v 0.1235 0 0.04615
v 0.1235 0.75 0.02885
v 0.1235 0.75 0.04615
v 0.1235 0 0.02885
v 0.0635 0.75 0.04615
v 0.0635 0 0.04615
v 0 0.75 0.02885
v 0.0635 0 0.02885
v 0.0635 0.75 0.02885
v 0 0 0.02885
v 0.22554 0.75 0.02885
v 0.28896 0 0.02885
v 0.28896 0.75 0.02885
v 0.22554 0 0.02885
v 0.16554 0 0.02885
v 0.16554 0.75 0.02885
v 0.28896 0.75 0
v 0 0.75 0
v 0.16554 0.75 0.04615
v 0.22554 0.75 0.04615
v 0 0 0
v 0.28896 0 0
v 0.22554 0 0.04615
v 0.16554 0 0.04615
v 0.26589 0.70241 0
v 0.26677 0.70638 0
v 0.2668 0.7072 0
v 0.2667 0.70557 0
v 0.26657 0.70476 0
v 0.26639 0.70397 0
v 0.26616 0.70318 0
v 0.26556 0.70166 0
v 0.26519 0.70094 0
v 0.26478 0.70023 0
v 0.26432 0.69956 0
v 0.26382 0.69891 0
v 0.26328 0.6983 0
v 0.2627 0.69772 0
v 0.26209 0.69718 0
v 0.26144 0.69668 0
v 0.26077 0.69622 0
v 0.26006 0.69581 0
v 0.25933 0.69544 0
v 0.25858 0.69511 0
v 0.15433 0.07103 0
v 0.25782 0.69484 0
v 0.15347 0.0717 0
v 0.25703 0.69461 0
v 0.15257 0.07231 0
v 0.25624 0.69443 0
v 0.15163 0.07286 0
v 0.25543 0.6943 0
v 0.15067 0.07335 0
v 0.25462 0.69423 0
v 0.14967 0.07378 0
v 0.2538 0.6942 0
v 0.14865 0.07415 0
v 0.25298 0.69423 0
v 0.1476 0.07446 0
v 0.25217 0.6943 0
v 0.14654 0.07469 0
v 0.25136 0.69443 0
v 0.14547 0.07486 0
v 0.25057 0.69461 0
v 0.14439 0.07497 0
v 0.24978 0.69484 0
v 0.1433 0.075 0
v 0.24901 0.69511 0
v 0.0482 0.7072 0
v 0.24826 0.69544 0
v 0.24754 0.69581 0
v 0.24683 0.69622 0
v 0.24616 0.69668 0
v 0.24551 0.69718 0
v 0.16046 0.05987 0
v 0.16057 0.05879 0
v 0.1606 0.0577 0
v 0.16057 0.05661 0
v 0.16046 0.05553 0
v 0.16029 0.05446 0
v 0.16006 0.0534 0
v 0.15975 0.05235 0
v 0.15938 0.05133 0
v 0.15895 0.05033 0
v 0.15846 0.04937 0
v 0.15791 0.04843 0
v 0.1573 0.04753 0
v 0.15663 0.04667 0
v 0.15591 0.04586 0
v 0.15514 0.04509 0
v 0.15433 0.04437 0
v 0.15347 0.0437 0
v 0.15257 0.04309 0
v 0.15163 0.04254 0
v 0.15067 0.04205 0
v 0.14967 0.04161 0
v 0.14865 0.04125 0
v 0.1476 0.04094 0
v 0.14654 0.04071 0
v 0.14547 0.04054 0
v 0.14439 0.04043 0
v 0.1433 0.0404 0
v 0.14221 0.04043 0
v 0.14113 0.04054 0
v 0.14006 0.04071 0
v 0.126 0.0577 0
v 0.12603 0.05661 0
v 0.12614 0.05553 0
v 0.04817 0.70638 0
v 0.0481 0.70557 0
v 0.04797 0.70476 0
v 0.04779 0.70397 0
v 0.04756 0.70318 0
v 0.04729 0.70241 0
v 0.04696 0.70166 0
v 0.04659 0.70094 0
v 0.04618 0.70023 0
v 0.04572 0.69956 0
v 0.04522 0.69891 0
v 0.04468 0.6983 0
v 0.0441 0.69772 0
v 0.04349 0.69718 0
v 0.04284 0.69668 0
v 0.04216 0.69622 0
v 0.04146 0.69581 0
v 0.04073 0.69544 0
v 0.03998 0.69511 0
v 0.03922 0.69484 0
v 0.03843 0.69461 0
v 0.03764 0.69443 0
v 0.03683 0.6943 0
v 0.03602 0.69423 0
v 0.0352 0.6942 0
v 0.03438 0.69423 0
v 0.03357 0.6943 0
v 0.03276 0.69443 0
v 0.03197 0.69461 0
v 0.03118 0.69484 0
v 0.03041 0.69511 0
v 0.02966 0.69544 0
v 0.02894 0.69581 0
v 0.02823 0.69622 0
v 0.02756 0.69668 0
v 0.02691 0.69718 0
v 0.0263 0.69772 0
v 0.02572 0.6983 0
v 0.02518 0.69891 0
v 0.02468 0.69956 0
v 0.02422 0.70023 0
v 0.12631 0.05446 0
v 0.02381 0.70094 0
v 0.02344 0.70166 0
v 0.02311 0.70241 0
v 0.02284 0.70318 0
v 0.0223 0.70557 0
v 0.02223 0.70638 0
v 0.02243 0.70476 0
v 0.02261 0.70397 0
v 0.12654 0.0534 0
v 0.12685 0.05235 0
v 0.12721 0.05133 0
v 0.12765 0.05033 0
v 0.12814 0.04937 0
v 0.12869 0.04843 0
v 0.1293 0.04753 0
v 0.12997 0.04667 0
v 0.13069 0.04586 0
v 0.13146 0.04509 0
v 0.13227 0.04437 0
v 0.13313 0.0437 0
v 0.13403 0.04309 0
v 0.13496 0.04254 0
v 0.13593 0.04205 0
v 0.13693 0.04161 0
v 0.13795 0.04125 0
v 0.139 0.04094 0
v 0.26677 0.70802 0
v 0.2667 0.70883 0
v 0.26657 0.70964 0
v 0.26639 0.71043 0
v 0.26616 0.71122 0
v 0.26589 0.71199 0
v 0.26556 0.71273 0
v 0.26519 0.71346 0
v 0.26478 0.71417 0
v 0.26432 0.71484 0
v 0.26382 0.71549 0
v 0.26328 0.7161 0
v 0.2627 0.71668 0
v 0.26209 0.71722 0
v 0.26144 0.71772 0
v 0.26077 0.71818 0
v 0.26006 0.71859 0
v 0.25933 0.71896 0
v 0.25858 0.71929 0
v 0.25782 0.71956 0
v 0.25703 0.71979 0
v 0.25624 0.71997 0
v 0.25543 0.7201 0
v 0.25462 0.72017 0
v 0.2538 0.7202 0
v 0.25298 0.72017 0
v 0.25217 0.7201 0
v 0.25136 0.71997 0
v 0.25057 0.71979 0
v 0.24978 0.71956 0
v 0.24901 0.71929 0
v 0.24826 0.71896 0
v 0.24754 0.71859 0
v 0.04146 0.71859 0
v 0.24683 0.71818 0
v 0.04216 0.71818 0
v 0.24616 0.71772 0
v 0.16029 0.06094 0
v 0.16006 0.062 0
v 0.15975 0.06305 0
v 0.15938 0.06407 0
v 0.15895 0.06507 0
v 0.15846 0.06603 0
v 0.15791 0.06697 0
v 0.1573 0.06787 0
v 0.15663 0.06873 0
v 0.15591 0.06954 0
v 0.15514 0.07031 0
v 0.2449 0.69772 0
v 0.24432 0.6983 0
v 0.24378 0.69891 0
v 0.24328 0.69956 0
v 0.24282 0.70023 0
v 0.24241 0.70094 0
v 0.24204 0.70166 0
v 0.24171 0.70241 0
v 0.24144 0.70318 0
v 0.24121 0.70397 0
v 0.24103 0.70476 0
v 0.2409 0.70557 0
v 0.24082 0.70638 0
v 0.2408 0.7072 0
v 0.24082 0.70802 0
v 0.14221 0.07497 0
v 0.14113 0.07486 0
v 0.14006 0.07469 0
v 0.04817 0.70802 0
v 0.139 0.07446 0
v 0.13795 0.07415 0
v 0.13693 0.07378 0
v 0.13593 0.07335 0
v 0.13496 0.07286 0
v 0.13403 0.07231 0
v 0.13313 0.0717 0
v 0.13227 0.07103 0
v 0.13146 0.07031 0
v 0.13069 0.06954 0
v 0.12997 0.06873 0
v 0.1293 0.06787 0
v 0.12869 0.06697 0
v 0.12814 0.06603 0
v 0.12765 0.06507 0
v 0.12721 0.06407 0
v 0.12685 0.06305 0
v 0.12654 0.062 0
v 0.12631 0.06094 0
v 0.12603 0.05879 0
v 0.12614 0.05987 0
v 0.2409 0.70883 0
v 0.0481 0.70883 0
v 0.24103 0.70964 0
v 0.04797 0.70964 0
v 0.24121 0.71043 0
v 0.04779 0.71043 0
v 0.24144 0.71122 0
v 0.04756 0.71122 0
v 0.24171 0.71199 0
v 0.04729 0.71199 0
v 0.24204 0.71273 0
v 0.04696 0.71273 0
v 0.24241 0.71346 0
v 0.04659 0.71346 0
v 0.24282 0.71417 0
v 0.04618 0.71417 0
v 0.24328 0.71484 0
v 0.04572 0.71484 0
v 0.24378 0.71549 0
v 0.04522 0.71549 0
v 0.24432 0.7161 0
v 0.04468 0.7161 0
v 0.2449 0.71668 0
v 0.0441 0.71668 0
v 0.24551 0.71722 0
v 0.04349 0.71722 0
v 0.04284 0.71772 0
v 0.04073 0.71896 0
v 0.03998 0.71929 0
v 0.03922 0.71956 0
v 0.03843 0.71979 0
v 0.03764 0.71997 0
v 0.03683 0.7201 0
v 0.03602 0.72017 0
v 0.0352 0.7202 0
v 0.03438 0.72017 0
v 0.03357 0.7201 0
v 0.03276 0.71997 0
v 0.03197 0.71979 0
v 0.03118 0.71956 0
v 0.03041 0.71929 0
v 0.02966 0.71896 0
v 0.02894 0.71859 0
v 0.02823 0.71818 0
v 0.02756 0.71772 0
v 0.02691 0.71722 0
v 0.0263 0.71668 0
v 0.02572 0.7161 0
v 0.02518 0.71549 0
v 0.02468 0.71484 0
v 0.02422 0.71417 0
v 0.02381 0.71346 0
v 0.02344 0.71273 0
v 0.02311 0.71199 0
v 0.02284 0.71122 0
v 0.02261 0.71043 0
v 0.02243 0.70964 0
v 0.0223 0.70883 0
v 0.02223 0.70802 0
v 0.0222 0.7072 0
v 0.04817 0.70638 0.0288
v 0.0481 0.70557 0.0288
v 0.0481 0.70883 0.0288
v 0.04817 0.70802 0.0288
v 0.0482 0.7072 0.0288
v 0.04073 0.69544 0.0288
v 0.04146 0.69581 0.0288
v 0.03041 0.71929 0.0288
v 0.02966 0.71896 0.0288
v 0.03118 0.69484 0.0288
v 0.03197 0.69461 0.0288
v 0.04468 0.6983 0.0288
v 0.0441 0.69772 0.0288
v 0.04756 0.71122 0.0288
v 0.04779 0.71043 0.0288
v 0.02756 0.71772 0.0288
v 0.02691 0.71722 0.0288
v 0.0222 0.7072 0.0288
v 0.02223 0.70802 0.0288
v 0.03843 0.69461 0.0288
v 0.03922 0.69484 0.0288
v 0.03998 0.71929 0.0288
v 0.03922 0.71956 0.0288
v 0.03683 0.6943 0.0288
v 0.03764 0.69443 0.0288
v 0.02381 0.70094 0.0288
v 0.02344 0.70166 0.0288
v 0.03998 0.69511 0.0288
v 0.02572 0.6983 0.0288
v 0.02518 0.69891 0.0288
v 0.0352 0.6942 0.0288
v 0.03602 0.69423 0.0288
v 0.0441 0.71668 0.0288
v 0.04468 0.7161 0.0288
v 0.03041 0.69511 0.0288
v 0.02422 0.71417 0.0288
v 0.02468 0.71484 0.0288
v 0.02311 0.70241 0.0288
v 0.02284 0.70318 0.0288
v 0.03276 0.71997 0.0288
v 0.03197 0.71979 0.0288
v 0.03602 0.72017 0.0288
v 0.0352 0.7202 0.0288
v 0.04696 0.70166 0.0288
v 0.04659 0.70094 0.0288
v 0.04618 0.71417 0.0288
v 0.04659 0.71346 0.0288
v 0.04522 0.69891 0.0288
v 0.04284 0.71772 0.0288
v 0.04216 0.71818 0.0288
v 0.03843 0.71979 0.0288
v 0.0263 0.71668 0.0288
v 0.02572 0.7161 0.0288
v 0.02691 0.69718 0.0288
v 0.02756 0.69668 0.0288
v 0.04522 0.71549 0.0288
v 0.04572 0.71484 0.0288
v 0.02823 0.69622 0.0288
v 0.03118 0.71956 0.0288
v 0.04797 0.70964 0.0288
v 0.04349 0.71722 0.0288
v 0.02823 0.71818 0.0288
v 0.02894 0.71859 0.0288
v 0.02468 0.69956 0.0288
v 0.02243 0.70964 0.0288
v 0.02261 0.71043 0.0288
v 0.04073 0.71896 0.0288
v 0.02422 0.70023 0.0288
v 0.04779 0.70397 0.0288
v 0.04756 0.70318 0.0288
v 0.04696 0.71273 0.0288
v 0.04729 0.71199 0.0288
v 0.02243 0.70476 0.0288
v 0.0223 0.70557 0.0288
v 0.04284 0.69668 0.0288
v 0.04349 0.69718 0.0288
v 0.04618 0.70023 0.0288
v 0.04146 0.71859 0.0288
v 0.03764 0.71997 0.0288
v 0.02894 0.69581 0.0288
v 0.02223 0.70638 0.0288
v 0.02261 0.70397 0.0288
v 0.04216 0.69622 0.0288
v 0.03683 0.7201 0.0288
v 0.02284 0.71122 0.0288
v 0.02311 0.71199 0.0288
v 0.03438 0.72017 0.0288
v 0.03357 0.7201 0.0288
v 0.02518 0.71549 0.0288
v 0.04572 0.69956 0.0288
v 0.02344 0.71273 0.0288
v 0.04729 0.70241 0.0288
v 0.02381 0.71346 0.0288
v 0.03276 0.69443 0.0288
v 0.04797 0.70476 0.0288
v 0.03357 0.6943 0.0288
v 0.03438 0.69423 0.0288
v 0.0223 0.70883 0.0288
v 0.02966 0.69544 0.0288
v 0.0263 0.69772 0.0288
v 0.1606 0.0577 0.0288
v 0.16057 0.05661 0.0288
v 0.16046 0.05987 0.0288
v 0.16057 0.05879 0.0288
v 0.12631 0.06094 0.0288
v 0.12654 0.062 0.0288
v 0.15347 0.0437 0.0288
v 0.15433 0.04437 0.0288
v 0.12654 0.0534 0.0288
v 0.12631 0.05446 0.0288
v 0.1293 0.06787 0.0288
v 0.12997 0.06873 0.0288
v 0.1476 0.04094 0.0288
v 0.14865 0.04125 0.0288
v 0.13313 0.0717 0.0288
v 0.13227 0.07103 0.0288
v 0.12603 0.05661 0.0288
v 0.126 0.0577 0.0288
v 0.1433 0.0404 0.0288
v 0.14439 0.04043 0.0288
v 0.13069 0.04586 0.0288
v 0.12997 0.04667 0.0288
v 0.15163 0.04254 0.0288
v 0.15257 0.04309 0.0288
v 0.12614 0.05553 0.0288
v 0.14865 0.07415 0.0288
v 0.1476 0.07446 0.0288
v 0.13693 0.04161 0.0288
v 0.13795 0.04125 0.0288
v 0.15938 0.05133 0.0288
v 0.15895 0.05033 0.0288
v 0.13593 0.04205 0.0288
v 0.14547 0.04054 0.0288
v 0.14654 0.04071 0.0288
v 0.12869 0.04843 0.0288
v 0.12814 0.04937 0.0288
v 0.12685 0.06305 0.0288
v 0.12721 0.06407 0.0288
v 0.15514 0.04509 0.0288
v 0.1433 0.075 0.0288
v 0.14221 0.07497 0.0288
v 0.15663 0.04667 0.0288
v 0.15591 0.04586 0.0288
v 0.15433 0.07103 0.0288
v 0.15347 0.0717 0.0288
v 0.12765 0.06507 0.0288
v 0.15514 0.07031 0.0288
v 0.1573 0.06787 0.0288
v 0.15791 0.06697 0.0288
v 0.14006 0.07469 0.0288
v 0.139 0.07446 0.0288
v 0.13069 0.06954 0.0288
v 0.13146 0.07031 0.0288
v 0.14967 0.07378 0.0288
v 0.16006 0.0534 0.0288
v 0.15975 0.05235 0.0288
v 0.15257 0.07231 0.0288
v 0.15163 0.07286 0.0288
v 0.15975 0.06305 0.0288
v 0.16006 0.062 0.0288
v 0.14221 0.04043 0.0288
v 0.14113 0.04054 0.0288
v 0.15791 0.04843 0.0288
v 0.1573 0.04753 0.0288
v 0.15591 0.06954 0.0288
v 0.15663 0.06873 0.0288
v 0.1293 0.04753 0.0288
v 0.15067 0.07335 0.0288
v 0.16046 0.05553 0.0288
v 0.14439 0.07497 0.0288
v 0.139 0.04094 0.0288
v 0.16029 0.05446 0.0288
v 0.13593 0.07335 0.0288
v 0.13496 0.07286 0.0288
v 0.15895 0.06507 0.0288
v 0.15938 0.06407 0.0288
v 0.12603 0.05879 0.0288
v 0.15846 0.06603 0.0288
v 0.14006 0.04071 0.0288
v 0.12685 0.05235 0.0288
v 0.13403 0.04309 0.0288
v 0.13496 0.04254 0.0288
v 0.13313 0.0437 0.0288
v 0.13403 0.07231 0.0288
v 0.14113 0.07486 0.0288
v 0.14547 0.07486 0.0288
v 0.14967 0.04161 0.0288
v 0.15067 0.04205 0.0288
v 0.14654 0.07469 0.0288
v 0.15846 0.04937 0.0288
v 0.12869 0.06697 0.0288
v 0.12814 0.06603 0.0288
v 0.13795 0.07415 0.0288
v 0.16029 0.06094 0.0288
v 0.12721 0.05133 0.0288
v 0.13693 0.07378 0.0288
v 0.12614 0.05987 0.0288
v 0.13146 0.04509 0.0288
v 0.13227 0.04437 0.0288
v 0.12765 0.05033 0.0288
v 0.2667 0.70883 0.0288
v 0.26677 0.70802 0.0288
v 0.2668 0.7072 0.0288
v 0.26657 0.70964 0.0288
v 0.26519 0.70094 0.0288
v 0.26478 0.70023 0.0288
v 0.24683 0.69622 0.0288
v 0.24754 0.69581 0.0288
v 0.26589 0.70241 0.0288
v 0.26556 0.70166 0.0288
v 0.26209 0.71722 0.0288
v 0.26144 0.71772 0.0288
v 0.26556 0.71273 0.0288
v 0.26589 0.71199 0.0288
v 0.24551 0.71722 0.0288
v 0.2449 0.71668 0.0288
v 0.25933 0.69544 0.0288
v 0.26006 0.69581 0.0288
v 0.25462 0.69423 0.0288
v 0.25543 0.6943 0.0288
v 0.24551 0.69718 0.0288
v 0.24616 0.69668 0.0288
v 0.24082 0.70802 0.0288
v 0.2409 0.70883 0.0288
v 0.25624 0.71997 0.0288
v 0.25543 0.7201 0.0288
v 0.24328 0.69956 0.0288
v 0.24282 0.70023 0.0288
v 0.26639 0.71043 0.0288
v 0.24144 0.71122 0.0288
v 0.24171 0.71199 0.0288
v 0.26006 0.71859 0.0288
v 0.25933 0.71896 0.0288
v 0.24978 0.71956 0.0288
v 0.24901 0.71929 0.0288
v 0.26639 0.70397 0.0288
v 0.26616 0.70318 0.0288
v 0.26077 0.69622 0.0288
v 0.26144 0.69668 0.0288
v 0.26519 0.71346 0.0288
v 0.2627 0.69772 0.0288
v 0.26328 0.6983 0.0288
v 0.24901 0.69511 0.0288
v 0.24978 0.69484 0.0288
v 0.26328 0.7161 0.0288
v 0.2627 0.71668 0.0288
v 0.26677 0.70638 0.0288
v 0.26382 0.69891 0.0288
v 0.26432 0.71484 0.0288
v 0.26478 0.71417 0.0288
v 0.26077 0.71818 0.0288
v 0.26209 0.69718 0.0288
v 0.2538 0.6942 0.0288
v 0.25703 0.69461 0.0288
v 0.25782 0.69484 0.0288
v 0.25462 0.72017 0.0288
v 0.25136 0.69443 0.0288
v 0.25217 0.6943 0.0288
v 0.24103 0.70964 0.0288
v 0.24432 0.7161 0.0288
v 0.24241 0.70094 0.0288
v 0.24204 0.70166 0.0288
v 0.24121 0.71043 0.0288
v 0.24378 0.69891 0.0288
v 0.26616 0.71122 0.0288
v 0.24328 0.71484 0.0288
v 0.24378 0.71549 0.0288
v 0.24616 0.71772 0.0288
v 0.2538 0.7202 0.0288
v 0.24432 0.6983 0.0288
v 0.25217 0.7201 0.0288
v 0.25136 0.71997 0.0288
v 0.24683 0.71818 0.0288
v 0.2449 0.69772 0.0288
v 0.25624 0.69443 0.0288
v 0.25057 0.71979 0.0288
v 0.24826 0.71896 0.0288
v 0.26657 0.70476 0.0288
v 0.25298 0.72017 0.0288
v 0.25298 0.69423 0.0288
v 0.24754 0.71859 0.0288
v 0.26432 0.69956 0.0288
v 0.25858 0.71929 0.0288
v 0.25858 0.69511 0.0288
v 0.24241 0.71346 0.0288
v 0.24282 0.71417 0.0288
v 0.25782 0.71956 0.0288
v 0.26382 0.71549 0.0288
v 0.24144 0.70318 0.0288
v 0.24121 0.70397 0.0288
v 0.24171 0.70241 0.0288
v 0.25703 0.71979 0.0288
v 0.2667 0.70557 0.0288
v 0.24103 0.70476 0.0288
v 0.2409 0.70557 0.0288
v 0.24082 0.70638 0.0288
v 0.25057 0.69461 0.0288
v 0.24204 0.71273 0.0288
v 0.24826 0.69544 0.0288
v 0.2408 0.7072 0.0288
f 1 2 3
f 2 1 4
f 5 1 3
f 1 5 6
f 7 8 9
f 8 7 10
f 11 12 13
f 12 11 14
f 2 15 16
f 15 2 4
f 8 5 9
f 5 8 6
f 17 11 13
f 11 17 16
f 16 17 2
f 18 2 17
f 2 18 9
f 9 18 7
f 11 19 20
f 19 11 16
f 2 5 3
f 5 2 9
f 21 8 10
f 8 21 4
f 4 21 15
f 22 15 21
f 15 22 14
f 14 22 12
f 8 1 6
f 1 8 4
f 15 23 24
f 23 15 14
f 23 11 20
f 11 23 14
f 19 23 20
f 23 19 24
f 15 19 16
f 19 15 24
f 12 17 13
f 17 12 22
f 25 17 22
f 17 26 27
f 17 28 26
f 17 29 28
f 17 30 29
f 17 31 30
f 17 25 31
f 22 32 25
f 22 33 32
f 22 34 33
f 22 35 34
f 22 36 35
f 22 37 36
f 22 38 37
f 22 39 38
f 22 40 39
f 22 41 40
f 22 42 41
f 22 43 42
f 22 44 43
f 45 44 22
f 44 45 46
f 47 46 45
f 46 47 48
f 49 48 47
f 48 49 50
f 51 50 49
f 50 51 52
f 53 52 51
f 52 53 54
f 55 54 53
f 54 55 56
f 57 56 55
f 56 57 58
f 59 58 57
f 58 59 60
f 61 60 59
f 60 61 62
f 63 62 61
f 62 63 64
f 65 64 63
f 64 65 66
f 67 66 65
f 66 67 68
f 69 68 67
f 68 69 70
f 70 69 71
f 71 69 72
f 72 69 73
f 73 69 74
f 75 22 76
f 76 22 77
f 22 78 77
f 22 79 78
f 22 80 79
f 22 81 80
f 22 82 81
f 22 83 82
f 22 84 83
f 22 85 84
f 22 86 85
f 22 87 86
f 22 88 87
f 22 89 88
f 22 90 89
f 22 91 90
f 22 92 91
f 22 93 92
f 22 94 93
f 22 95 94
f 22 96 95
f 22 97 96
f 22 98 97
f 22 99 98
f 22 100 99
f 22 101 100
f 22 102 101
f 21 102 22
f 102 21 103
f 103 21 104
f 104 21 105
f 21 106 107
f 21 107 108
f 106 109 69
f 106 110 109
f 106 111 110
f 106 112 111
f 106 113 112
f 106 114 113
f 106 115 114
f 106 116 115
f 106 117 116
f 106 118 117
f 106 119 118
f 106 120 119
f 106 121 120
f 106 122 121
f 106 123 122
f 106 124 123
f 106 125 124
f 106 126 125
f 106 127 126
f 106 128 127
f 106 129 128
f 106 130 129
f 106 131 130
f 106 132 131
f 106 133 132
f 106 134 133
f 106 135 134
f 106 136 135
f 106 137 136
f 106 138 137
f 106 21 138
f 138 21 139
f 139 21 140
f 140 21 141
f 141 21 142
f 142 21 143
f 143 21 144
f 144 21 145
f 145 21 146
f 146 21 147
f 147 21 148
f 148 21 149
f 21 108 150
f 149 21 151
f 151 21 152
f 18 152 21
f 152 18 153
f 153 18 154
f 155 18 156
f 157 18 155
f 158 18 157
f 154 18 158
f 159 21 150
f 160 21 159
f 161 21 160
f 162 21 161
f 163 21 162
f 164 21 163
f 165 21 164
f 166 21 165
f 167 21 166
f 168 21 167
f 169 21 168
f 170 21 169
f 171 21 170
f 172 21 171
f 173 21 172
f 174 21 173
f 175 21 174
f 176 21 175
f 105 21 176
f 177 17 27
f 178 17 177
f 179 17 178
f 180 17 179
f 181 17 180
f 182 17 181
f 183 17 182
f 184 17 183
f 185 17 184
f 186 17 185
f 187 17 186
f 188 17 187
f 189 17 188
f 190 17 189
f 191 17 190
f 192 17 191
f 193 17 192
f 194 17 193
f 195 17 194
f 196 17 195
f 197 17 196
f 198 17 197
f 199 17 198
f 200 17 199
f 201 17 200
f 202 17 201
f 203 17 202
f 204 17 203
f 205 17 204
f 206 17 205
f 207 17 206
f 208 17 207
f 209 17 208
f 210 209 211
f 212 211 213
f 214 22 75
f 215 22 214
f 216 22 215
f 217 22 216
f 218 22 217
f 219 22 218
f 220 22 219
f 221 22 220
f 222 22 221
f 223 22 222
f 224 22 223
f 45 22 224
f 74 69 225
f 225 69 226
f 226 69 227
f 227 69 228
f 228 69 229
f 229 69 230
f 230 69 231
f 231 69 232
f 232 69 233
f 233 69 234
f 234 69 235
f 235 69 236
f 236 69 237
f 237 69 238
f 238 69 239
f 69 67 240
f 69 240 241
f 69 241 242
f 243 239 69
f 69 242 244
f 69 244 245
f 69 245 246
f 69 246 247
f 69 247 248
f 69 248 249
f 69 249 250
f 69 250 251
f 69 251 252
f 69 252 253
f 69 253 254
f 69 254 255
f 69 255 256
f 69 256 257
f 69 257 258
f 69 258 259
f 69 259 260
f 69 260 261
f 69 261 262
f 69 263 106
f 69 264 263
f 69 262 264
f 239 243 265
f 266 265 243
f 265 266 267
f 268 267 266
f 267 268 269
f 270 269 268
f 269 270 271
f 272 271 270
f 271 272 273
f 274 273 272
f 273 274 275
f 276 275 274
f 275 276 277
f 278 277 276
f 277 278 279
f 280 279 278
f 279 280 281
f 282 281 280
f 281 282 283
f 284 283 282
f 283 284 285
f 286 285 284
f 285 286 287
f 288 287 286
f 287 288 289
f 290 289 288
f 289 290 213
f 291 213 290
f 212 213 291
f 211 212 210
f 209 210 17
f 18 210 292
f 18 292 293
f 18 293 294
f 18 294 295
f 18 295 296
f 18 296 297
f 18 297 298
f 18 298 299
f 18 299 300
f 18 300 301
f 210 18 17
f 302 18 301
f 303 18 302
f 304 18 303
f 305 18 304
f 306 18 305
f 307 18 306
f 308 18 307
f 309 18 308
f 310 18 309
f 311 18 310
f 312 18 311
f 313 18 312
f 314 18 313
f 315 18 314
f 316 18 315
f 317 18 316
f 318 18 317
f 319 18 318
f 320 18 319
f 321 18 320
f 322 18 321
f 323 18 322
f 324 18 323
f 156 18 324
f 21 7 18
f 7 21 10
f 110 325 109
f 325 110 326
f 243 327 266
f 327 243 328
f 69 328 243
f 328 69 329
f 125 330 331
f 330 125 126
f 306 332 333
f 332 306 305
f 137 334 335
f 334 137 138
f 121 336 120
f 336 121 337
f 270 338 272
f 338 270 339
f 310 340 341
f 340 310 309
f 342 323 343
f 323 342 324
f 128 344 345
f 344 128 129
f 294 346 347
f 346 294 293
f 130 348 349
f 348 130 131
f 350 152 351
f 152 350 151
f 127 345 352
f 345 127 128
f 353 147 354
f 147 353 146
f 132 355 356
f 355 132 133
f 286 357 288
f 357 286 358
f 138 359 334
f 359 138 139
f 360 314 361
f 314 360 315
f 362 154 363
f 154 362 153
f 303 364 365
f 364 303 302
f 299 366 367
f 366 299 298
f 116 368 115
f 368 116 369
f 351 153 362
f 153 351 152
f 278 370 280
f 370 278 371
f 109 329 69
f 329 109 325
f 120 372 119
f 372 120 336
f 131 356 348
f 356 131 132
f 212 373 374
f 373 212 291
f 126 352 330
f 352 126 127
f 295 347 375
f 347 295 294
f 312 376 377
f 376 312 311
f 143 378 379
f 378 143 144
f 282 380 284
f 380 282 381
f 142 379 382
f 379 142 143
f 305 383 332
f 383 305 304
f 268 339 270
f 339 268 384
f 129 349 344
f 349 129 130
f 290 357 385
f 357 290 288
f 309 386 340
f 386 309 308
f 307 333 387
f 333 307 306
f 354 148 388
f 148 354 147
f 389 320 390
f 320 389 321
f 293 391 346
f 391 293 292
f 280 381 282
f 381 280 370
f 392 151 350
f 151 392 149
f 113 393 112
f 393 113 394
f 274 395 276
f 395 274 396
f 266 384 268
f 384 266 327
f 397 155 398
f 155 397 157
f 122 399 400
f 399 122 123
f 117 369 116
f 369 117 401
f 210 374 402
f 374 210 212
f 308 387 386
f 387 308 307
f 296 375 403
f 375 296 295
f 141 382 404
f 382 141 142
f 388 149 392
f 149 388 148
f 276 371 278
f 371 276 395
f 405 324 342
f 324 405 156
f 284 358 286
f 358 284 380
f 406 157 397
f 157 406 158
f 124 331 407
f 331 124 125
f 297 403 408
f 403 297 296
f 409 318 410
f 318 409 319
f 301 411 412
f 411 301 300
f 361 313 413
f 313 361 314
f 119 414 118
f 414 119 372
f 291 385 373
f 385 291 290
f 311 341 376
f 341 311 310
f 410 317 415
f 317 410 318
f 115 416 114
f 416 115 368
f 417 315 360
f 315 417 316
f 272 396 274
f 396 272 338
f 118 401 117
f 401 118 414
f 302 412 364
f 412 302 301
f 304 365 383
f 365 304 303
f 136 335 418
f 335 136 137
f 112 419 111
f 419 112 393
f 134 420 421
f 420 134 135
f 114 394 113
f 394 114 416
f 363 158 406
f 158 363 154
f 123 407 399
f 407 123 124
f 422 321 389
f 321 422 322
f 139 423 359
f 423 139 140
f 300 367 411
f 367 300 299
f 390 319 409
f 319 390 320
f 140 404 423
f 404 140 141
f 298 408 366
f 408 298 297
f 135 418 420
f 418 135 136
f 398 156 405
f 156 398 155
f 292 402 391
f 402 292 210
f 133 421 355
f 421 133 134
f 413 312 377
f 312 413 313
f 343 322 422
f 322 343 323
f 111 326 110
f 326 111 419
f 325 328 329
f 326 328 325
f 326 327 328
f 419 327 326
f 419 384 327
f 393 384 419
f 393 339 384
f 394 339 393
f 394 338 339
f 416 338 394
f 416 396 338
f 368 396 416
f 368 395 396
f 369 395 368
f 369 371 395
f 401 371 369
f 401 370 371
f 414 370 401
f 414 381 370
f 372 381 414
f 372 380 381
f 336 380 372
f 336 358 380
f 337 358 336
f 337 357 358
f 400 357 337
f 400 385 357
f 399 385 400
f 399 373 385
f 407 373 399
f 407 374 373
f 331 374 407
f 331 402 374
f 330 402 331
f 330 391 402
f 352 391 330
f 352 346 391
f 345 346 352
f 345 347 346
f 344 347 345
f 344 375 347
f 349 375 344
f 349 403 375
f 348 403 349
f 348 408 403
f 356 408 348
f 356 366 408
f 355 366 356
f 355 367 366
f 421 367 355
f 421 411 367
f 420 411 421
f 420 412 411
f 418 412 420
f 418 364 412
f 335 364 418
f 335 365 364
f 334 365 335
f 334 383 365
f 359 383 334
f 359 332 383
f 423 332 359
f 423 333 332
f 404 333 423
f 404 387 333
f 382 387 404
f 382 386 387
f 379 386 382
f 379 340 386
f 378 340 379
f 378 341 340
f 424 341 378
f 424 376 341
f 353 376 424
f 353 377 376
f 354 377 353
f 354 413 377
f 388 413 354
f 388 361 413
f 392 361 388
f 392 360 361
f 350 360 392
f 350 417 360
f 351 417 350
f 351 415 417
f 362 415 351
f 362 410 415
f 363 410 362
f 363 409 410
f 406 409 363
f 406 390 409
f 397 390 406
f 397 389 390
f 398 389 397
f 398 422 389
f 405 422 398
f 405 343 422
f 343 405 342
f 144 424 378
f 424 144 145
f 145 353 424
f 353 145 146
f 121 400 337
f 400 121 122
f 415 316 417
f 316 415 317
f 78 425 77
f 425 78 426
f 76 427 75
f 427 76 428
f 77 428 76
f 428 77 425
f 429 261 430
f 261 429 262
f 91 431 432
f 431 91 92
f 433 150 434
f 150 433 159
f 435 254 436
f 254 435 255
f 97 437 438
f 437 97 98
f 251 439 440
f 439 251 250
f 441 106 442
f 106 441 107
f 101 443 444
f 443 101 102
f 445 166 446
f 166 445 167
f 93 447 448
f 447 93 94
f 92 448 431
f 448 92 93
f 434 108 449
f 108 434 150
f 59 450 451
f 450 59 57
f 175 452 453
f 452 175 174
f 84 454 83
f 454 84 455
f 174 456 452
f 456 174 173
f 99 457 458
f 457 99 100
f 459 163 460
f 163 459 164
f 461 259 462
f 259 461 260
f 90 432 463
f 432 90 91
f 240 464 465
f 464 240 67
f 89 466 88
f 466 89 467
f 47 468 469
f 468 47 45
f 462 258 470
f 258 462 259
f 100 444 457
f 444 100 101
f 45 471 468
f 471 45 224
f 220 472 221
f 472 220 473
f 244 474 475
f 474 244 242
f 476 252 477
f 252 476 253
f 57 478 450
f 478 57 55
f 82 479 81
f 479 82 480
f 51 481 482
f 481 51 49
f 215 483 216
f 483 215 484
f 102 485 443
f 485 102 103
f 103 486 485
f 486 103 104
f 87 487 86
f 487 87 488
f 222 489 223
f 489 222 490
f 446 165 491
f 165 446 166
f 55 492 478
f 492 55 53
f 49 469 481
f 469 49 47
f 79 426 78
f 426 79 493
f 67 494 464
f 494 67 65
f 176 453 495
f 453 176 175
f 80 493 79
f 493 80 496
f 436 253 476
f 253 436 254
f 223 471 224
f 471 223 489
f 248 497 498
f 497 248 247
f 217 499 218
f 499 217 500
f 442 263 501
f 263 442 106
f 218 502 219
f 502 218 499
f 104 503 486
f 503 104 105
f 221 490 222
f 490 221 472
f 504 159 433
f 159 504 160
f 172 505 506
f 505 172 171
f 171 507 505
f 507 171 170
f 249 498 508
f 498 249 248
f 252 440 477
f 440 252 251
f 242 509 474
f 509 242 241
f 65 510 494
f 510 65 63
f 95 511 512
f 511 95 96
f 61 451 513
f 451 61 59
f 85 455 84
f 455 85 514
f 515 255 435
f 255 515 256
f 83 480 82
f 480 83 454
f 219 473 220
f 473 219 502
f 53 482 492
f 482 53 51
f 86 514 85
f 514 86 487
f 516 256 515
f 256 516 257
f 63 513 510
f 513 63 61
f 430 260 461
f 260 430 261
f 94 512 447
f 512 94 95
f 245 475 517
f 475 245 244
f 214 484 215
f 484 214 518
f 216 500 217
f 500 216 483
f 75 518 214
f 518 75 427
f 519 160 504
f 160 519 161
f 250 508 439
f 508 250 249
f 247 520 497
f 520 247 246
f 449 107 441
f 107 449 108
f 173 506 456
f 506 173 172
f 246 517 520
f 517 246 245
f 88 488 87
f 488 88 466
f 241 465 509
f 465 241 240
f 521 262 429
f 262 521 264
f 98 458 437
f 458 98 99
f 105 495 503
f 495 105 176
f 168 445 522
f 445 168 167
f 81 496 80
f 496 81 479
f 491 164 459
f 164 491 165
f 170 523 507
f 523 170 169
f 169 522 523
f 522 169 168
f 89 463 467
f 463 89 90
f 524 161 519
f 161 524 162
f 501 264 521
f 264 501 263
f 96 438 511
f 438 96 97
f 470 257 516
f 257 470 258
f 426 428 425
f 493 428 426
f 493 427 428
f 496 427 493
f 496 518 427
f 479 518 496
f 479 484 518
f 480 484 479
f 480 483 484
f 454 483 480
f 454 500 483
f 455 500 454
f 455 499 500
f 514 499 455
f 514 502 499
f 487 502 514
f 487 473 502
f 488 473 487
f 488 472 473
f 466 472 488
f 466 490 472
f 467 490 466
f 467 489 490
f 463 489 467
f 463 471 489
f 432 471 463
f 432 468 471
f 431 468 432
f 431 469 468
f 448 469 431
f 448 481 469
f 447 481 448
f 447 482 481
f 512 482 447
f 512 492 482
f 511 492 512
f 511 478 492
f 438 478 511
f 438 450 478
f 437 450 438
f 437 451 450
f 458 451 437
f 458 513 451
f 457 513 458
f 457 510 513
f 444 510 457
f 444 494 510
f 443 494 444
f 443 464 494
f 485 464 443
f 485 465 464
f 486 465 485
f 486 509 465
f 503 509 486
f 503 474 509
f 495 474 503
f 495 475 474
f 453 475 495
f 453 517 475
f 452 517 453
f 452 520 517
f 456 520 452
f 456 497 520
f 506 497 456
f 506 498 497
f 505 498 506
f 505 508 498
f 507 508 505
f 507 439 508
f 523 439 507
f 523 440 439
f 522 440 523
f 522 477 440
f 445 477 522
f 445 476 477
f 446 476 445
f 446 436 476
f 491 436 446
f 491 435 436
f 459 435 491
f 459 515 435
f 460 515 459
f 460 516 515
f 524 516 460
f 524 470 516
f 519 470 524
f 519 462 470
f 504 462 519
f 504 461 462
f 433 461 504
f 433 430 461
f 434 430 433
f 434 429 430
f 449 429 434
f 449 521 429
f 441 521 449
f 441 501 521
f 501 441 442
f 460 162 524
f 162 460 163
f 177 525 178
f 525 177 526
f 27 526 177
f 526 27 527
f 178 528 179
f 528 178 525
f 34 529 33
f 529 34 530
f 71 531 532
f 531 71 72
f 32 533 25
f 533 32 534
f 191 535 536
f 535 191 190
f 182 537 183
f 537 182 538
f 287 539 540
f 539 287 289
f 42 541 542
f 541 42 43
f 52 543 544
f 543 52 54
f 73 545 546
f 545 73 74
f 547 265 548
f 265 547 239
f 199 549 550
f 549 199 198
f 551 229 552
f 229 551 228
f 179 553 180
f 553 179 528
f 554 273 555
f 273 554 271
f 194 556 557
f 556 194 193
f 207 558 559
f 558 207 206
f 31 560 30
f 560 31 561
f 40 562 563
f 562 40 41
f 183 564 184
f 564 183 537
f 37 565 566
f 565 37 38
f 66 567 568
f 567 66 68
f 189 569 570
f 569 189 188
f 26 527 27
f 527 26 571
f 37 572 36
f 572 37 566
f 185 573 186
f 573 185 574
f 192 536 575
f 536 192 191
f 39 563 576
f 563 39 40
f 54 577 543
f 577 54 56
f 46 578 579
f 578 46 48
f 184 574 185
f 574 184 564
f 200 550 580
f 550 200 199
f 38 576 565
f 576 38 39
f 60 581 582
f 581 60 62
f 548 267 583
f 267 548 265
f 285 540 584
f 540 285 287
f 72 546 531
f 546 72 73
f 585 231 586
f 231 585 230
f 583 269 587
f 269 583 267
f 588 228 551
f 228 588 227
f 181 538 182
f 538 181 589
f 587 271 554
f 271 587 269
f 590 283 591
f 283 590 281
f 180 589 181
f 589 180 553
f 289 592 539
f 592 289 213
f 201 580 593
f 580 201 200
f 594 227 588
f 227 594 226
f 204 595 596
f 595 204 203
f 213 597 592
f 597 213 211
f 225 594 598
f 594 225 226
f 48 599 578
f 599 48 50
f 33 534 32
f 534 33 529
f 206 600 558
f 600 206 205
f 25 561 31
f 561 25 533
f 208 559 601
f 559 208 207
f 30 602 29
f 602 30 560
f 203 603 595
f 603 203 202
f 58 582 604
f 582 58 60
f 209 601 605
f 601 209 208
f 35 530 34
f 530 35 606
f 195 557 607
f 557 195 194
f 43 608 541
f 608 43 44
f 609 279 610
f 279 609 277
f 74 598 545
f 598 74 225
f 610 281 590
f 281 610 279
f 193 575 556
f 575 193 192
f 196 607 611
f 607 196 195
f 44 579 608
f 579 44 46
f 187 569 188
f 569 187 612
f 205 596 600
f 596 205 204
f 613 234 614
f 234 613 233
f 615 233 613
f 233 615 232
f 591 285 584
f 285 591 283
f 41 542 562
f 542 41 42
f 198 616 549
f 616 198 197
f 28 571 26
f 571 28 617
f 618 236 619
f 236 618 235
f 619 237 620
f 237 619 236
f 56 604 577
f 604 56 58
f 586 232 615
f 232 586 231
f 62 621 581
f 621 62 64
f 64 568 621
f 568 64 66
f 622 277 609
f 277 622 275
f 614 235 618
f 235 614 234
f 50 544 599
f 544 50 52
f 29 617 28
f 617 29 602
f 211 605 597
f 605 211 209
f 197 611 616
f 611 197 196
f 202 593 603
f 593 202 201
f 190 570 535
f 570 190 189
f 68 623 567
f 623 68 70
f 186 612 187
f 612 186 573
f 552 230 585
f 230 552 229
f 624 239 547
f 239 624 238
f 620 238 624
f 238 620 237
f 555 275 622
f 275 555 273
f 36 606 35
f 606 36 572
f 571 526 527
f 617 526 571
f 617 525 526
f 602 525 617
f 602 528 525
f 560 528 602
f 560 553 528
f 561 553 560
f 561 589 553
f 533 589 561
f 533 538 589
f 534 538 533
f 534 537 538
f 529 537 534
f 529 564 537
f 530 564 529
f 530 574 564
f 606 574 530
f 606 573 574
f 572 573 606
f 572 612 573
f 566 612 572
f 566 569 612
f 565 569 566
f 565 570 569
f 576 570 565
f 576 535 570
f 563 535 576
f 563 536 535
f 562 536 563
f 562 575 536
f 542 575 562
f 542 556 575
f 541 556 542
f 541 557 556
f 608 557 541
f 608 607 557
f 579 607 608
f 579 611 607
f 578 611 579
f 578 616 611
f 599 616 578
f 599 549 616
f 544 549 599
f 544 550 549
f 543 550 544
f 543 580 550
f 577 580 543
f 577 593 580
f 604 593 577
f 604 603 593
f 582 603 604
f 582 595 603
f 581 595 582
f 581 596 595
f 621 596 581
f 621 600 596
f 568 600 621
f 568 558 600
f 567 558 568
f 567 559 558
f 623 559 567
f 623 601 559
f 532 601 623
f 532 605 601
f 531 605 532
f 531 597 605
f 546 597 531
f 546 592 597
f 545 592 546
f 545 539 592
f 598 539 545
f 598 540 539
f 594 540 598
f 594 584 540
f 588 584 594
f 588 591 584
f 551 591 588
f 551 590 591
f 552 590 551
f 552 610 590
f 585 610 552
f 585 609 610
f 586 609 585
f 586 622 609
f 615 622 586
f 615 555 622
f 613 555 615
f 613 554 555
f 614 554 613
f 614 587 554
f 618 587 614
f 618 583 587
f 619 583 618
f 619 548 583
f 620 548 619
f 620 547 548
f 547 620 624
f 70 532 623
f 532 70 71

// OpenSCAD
$fn = 100;

// --- Parametric Variables ---
// Base solid dimensions
base_len = 0.28896;
base_wid = 0.75;
base_hgt = 0.028846;

// Rib layout parameters
rib_left_offset = 0.0635;
rib_outer_len = 0.162037;
rib_gap = 0.042037;
rib_width = (rib_outer_len - rib_gap) / 2;
rib_hgt = 0.017308;

// Circular feature stages
upper_recess_z = 0.0057;
upper_recess_h = 0.0231;
deeper_cut_z = -0.1154;
deeper_cut_h = 0.1442;

// Hole axes: [left_offset, front_offset, radius]
hole_axes = [
    [0.0352, 0.7072, 0.013],
    [0.1433, 0.0577, 0.0173],
    [0.2538, 0.7072, 0.013]
];

// --- Module Definitions ---
// Base rectangular solid
module base_solid() {
    cube([base_len, base_wid, base_hgt], center=false);
}

// Two separate lengthwise ribs on top of base
module rib_pair() {
    translate([rib_left_offset, 0, base_hgt])
        cube([rib_width, base_wid, rib_hgt], center=false);
    translate([rib_left_offset + rib_width + rib_gap, 0, base_hgt])
        cube([rib_width, base_wid, rib_hgt], center=false);
}

// Stepped circular cut for a single axis
module stepped_circular_cut(x, y, r) {
    union() {
        // Deeper stage extending below base underside
        translate([x, y, deeper_cut_z])
            cylinder(h=deeper_cut_h, r=r, center=false);
        // Upper recess stage stopping above base underside
        translate([x, y, upper_recess_z])
            cylinder(h=upper_recess_h, r=r, center=false);
    }
}

// --- Main Assembly ---
difference() {
    // Combine base and ribs
    union() {
        base_solid();
        rib_pair();
    }
    // Subtract stepped circular features
    for (h = hole_axes) {
        stepped_circular_cut(h[0], h[1], h[2]);
    }
}
